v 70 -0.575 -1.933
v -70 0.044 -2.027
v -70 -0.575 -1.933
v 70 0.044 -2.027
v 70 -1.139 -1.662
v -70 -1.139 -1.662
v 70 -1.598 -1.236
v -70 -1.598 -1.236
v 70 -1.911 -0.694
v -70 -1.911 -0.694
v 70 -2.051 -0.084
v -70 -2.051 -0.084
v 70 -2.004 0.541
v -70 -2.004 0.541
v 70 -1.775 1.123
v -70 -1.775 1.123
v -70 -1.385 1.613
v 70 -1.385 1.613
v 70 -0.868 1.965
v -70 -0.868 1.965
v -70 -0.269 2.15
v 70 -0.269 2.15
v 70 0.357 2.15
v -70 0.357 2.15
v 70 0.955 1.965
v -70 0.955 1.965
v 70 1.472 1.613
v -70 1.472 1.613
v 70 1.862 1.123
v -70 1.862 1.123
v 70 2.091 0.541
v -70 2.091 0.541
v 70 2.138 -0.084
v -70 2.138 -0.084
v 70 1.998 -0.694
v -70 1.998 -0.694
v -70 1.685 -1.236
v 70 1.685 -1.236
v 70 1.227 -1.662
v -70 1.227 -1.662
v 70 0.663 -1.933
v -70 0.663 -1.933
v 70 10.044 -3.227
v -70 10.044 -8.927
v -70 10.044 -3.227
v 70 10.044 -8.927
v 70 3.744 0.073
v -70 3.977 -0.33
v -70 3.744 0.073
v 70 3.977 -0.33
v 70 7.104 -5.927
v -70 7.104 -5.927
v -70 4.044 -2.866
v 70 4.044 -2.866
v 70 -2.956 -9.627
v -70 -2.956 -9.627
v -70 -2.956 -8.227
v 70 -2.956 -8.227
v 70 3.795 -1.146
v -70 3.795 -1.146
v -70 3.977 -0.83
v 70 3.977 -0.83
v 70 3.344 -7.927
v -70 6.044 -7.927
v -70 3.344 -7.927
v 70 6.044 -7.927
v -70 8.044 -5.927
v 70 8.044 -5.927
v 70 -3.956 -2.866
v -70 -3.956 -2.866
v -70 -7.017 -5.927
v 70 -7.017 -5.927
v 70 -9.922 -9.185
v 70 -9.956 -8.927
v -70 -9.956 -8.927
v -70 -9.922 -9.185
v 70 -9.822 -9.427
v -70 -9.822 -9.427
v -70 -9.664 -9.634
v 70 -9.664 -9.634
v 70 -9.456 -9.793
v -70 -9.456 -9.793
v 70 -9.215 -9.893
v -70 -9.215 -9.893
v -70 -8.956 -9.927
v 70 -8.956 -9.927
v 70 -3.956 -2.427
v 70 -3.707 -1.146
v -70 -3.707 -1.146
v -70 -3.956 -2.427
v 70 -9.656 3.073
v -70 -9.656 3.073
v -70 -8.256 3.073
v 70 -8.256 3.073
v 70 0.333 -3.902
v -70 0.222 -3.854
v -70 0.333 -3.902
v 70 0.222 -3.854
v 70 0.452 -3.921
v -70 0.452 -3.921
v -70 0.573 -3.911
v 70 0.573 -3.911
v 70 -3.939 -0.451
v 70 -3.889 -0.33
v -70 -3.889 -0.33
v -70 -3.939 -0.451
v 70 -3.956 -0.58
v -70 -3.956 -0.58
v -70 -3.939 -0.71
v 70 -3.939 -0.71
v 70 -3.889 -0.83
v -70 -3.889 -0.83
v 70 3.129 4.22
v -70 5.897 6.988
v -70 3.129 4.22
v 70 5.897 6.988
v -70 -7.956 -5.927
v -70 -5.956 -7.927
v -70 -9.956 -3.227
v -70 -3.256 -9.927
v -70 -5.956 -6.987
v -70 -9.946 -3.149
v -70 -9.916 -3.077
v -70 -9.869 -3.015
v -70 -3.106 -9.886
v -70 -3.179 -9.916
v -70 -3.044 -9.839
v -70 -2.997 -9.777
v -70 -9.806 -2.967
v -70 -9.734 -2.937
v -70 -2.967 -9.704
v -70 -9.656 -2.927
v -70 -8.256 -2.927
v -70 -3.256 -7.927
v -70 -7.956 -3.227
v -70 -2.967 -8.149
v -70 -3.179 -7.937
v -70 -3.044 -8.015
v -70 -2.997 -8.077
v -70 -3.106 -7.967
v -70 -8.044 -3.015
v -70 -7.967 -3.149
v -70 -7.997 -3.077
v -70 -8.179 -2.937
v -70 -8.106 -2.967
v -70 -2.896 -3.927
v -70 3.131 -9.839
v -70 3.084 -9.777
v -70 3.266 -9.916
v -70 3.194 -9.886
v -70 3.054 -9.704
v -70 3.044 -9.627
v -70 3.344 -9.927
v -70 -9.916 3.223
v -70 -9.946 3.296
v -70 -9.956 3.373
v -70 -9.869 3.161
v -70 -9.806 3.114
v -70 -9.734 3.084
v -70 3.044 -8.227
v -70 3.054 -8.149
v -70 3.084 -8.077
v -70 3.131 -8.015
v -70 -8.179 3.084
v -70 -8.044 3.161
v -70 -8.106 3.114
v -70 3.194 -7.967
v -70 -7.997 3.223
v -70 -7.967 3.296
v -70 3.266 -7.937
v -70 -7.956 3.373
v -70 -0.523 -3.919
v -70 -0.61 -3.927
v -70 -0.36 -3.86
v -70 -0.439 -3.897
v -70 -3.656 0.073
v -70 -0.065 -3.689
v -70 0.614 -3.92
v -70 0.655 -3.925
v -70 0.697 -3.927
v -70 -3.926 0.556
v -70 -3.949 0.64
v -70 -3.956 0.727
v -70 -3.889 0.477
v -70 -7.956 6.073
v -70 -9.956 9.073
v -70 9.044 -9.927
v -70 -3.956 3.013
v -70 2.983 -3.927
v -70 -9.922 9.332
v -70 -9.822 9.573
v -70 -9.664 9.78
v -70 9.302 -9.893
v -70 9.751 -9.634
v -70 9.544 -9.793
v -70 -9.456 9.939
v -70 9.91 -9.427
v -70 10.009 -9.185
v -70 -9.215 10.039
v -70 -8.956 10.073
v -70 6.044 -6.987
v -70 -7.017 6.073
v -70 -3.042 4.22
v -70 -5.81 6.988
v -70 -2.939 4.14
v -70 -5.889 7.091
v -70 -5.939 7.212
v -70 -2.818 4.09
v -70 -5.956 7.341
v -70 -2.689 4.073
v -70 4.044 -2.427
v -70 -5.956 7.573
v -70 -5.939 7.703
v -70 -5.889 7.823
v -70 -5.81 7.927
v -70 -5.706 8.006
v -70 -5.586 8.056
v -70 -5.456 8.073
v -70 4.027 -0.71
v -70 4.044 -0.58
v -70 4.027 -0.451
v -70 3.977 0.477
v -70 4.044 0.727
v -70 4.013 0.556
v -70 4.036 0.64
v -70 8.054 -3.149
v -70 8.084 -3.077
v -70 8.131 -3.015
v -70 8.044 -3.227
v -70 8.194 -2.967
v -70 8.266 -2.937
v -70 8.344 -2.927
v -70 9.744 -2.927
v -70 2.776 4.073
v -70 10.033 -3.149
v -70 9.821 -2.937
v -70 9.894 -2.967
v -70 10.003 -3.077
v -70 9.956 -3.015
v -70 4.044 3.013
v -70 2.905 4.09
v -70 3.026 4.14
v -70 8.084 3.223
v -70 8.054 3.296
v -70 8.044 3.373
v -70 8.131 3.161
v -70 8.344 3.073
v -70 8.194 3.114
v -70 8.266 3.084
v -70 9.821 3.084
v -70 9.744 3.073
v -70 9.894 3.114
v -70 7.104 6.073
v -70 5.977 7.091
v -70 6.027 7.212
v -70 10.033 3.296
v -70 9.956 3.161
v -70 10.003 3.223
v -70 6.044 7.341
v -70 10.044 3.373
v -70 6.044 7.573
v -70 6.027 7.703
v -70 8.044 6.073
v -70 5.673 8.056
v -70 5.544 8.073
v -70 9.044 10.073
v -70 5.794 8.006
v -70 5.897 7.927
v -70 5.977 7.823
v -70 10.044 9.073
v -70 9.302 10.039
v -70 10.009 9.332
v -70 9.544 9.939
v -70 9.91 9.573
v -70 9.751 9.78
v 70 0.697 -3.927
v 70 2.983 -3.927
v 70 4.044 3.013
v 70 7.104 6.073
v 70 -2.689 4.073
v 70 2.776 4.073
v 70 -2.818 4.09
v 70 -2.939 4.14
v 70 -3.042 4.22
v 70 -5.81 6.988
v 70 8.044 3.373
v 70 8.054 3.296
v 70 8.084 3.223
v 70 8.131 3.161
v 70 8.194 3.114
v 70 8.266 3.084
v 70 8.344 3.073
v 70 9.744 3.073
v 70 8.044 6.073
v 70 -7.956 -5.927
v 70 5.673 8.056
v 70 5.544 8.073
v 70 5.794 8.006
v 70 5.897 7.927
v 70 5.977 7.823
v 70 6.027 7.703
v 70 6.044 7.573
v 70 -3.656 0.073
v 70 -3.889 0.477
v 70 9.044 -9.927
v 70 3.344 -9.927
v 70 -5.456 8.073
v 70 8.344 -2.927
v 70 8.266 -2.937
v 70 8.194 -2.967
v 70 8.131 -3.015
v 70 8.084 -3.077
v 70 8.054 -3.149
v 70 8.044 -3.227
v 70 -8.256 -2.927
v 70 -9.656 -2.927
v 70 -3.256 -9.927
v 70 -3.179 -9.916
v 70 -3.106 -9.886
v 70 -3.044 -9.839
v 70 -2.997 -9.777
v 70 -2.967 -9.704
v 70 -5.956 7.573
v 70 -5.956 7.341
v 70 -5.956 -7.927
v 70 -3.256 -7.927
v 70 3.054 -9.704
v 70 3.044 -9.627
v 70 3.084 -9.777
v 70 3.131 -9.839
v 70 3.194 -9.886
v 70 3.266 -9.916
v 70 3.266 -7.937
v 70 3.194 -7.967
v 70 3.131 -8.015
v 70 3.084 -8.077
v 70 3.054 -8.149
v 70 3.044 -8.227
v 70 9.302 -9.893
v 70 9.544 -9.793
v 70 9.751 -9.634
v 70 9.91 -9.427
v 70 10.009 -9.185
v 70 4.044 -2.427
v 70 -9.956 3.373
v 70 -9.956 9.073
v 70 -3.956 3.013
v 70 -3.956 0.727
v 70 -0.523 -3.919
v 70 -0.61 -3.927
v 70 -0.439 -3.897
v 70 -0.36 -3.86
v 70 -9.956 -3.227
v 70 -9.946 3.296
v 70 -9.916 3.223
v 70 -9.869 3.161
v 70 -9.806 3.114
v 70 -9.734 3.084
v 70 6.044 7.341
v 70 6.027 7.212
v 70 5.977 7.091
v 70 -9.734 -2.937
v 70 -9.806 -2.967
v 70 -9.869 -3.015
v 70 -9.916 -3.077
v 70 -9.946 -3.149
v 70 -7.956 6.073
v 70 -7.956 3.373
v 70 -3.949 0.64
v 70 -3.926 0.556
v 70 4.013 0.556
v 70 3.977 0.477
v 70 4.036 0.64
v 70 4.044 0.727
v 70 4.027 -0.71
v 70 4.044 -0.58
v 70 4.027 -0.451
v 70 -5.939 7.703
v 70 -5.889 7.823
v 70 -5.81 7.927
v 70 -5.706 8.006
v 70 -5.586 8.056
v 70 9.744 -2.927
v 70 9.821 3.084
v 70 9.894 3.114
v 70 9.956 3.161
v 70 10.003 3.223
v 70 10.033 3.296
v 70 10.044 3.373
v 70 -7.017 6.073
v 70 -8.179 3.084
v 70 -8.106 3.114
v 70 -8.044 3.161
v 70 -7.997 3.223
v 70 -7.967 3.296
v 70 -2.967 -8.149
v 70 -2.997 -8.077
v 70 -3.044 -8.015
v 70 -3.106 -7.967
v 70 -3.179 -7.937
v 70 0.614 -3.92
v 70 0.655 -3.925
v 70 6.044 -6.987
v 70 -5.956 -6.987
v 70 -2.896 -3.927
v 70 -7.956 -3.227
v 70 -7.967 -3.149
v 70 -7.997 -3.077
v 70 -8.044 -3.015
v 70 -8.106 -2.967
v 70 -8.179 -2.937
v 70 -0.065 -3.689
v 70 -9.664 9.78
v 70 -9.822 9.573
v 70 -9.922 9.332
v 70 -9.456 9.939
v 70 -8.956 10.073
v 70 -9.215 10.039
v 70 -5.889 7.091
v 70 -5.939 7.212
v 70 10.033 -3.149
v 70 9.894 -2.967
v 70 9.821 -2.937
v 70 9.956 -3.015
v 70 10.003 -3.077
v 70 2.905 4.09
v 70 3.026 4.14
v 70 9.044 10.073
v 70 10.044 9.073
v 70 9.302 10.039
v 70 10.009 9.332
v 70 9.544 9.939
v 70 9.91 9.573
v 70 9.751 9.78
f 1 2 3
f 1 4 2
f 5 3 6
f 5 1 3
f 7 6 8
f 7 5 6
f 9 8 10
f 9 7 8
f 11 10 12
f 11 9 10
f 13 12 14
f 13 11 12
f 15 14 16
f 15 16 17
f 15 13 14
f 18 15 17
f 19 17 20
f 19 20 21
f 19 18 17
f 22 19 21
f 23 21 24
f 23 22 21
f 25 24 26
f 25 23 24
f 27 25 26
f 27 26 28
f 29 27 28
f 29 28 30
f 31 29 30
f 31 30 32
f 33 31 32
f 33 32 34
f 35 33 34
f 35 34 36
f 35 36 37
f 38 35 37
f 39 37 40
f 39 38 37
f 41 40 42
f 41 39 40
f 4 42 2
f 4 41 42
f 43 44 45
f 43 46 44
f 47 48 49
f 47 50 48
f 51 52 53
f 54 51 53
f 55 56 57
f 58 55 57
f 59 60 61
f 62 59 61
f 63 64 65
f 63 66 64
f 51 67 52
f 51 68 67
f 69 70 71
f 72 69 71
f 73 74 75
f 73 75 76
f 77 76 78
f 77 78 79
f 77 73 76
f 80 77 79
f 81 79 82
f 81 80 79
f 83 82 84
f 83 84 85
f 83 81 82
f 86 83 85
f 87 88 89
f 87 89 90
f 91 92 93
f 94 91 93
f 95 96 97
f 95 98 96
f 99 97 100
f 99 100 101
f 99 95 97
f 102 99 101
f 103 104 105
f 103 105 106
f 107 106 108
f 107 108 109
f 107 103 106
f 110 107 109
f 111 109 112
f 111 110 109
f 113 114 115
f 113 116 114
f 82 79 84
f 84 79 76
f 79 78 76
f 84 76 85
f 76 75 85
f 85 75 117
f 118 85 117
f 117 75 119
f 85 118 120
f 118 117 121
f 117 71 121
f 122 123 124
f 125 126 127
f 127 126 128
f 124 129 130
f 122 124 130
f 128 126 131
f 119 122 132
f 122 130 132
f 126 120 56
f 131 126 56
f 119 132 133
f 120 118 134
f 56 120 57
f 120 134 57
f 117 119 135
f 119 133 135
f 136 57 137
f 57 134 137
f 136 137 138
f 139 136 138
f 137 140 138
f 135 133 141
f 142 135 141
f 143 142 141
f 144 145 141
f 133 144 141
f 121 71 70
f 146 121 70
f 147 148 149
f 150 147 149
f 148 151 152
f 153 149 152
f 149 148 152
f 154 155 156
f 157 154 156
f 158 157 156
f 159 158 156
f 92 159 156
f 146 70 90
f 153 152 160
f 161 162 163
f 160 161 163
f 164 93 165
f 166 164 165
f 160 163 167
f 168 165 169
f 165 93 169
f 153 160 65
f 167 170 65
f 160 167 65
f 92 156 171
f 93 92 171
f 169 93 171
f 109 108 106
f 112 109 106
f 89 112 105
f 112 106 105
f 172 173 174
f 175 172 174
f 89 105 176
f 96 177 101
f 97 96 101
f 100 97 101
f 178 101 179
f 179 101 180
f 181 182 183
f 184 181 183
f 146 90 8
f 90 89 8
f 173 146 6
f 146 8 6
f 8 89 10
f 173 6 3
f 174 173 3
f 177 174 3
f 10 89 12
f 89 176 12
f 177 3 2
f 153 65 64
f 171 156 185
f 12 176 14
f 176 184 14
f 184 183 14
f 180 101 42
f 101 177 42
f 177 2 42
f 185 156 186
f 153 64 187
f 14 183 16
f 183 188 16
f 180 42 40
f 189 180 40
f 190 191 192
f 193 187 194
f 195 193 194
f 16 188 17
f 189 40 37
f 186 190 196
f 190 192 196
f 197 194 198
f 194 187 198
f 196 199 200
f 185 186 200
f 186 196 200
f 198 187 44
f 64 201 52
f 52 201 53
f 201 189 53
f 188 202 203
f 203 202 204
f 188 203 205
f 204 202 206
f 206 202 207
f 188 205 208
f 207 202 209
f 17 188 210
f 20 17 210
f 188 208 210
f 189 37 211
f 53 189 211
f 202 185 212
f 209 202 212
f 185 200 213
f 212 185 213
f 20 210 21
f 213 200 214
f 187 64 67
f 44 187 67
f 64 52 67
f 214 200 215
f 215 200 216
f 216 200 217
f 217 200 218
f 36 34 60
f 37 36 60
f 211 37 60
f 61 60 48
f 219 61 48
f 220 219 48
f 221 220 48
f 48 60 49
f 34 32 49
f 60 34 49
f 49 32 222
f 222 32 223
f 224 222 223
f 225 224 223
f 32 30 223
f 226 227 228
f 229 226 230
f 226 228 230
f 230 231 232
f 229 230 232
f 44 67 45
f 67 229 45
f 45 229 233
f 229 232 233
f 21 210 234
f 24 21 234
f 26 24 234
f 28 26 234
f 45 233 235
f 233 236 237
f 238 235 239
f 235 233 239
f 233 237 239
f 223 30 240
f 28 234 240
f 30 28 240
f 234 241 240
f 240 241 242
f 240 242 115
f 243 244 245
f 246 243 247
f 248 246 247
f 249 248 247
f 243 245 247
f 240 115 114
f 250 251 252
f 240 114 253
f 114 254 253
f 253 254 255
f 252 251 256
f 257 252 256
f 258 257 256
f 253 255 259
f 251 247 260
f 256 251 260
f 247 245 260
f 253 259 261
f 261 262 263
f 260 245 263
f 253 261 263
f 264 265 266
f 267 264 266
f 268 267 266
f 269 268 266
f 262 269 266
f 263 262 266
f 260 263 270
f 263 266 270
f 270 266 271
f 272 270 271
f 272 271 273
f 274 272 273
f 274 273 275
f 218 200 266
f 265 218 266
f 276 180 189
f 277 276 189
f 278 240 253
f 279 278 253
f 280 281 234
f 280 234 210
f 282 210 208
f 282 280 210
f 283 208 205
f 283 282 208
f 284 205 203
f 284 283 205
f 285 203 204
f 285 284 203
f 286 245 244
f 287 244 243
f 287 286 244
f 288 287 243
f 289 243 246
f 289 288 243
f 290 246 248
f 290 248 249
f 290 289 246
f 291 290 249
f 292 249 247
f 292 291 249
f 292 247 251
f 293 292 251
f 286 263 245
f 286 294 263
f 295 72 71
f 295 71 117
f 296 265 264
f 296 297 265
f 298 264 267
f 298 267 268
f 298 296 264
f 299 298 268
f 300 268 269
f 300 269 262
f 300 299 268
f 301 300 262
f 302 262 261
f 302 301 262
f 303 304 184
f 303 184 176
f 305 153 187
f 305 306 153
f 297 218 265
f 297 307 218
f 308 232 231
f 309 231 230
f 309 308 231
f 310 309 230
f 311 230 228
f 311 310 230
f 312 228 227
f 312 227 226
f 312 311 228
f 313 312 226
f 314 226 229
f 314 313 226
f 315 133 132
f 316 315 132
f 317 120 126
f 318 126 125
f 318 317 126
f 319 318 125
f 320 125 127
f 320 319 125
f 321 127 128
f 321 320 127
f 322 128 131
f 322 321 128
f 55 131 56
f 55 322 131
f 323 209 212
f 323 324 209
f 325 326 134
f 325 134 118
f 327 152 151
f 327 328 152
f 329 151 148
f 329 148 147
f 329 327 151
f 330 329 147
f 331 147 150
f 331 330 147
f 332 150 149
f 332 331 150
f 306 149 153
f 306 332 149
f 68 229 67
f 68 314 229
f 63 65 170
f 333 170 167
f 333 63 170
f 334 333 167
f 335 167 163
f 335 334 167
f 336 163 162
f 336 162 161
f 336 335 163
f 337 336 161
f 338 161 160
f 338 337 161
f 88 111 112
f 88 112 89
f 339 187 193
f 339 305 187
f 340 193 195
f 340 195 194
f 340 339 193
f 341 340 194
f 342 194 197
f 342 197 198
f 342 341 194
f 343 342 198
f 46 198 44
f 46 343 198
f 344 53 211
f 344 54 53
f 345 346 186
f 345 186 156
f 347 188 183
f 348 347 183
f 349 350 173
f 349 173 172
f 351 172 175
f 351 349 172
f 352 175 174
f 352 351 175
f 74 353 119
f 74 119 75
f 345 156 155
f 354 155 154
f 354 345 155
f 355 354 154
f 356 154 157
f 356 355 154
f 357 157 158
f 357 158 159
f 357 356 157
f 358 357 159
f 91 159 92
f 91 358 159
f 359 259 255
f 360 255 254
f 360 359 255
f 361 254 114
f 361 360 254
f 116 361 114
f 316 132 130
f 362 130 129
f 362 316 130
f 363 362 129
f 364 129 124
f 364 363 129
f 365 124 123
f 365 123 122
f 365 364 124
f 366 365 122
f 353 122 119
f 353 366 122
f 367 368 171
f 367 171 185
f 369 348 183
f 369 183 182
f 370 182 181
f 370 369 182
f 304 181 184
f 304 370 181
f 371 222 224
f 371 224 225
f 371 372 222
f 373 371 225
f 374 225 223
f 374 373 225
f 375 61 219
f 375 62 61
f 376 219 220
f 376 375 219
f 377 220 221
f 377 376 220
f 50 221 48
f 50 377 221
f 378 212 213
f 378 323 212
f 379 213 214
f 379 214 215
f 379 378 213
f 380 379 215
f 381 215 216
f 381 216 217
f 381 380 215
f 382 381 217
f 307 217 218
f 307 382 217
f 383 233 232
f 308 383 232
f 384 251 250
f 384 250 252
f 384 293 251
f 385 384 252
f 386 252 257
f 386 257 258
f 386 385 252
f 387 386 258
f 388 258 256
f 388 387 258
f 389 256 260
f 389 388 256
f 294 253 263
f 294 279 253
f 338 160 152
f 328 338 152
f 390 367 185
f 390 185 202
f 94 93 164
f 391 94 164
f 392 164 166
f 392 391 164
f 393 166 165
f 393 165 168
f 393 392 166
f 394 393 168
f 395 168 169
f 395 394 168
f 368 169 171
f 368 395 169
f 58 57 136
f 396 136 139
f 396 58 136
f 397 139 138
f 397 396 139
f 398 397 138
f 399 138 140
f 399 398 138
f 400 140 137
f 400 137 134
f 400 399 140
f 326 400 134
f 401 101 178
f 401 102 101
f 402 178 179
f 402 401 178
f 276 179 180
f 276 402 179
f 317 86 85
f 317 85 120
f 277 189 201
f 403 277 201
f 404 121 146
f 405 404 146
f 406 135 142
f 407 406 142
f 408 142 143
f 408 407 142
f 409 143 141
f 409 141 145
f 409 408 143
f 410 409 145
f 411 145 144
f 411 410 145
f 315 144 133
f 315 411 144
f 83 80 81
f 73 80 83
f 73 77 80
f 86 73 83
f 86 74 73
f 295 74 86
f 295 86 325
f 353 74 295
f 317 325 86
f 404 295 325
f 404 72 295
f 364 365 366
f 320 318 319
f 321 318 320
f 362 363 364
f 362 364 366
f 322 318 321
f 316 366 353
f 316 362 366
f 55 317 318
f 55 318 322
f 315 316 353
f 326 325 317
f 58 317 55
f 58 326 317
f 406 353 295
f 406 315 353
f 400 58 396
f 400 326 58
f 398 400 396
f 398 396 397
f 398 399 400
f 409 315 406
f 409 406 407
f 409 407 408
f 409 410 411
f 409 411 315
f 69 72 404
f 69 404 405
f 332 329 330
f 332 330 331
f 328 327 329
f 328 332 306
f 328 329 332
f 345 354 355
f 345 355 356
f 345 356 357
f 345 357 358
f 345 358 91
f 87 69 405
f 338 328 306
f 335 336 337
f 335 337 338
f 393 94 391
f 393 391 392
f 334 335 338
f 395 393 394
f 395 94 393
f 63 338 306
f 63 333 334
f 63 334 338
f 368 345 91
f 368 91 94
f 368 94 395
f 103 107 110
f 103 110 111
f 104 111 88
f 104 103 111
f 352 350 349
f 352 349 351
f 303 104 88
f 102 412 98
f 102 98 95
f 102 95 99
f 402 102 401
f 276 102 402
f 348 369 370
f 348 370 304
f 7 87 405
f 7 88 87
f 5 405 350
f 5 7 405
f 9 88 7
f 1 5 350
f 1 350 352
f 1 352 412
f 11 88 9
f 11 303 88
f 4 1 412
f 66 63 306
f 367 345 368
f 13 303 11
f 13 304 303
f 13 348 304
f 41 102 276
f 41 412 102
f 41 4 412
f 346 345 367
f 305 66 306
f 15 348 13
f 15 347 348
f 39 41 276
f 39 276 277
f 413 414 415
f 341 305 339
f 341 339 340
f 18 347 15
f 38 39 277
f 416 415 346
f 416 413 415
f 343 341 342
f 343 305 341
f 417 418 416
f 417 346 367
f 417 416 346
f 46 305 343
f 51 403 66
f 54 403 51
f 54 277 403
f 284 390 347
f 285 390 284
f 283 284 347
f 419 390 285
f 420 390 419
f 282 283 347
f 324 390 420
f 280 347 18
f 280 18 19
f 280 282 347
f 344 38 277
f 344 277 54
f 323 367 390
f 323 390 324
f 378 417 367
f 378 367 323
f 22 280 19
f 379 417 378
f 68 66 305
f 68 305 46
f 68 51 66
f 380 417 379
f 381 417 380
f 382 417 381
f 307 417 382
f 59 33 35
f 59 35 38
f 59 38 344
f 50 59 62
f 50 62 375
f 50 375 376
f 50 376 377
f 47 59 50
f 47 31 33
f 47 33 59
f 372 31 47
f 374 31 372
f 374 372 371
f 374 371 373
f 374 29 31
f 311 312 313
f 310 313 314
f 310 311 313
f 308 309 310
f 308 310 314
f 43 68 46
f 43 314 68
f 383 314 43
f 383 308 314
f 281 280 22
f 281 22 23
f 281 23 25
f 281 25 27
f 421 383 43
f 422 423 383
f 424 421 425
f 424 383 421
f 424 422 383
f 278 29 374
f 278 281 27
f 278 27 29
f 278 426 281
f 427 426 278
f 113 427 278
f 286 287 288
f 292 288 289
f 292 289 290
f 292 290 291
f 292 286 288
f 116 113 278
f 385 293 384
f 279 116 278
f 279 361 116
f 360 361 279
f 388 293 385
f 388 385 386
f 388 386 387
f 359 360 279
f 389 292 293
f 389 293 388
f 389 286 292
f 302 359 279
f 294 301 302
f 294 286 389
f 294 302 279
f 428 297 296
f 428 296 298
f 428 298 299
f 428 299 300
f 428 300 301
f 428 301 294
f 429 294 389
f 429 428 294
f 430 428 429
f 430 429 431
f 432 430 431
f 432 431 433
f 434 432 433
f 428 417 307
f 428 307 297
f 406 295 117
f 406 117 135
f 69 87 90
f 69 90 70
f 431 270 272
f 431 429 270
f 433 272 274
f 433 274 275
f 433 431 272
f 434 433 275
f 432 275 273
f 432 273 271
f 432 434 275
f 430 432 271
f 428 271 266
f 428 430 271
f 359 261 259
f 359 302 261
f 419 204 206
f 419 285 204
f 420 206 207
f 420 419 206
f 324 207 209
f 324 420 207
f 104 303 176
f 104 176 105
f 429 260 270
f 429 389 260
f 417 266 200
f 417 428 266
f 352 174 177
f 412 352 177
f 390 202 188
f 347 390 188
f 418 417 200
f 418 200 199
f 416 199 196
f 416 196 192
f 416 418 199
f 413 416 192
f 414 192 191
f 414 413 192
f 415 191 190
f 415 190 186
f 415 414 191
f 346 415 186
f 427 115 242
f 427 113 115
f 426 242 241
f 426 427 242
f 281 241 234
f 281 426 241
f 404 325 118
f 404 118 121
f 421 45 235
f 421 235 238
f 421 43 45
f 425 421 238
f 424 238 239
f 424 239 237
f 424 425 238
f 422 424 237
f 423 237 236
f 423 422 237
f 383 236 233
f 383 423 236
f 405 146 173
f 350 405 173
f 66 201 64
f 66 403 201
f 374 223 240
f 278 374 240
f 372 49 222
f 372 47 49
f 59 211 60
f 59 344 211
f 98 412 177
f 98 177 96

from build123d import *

# Parameters (mm, degrees)
F1_DEPTH = 70


# Not quite as in the source:
# - ends of sketch curves that miss each other by under 0.0002 mm in the source are joined


with BuildPart() as f1:
    # F0 (on Right) → F1 (new body, symmetric)
    with BuildSketch(Plane.YZ):
        with BuildLine():
            Line((9.043565, 10.073321), (0.043565, 10.073321))
            Line((0.043565, 10.073321), (-8.956435, 10.073321))
            ThreePointArc((-8.956435, 10.073321), (-9.6635417812, 9.7804277812), (-9.956435, 9.073321))
            Line((-9.956435, 9.073321), (-9.956435, 3.373321))
            ThreePointArc((-9.956435, 3.373321), (-9.8685670344, 3.1611889656), (-9.656435, 3.073321))
            Line((-9.656435, 3.073321), (-8.256435, 3.073321))
            ThreePointArc((-8.256435, 3.073321), (-8.0443029656, 3.1611889656), (-7.956435, 3.373321))
            Line((-7.956435, 3.373321), (-7.956435, 6.073321))
            Line((-7.956435, 6.073321), (-7.017095, 6.073321))
            Line((-7.017095, 6.073321), (-3.956435, 3.012661))
            Line((-3.956435, 3.012661), (-3.956435, 0.726911))
            ThreePointArc((-3.956435, 0.726911), (-3.9393979324, 0.5975015494), (-3.8894477764, 0.4769111291))
            Line((-3.8894477764, 0.4769111291), (-3.656435, 0.073321))
            Line((-3.656435, 0.073321), (-3.889448, -0.330269))
            ThreePointArc((-3.889448, -0.330269), (-3.956435, -0.580269), (-3.8894477764, -0.8302688709))
            Line((-3.8894477764, -0.8302688709), (-3.707412, -1.145565))
            Line((-3.707412, -1.145565), (-3.956435, -2.426679))
            Line((-3.956435, -2.426679), (-3.956435, -2.866019))
            Line((-3.956435, -2.866019), (-7.017095, -5.926679))
            Line((-7.017095, -5.926679), (-7.956435, -5.926679))
            Line((-7.956435, -5.926679), (-7.956435, -3.226679))
            ThreePointArc((-7.956435, -3.226679), (-8.0443029656, -3.0145469656), (-8.256435, -2.926679))
            Line((-8.256435, -2.926679), (-9.656435, -2.926679))
            ThreePointArc((-9.656435, -2.926679), (-9.8685670344, -3.0145469656), (-9.956435, -3.226679))
            Line((-9.956435, -3.226679), (-9.956435, -8.926679))
            ThreePointArc((-9.956435, -8.926679), (-9.6635417812, -9.6337857812), (-8.956435, -9.926679))
            Line((-8.956435, -9.926679), (-3.256435, -9.926679))
            ThreePointArc((-3.256435, -9.926679), (-3.0443029656, -9.8388110344), (-2.956435, -9.626679))
            Line((-2.956435, -9.626679), (-2.956435, -8.226679))
            ThreePointArc((-2.956435, -8.226679), (-3.0443029656, -8.0145469656), (-3.256435, -7.926679))
            Line((-3.256435, -7.926679), (-5.956435, -7.926679))
            Line((-5.956435, -7.926679), (-5.956435, -6.987339))
            Line((-5.956435, -6.987339), (-2.895775, -3.926679))
            Line((-2.895775, -3.926679), (-0.610025, -3.926679))
            ThreePointArc((-0.610025, -3.926679), (-0.4806155494, -3.9096419324), (-0.3600251291, -3.8596917764))
            Line((-0.3600251291, -3.8596917764), (-0.0645959325, -3.6891257984))
            Line((-0.0645959325, -3.6891257984), (0.2217128734, -3.8544264098))
            ThreePointArc((0.2217128734, -3.8544264098), (0.3921793907, -3.9150473077), (0.5730594828, -3.9110345539))
            ThreePointArc((0.5730594828, -3.9110345539), (0.6346161199, -3.9227524708), (0.697155, -3.926679))
            Line((0.697155, -3.926679), (2.982905, -3.926679))
            Line((2.982905, -3.926679), (6.043565, -6.987339))
            Line((6.043565, -6.987339), (6.043565, -7.926679))
            Line((6.043565, -7.926679), (3.343565, -7.926679))
            ThreePointArc((3.343565, -7.926679), (3.1314329656, -8.0145469656), (3.043565, -8.226679))
            Line((3.043565, -8.226679), (3.043565, -9.626679))
            ThreePointArc((3.043565, -9.626679), (3.1314329656, -9.8388110344), (3.343565, -9.926679))
            Line((3.343565, -9.926679), (9.043565, -9.926679))
            ThreePointArc((9.043565, -9.926679), (9.7506717812, -9.6337857812), (10.043565, -8.926679))
            Line((10.043565, -8.926679), (10.043565, -3.226679))
            ThreePointArc((10.043565, -3.226679), (9.9556970344, -3.0145469656), (9.743565, -2.926679))
            Line((9.743565, -2.926679), (8.343565, -2.926679))
            ThreePointArc((8.343565, -2.926679), (8.1314329656, -3.0145469656), (8.043565, -3.226679))
            Line((8.043565, -3.226679), (8.043565, -5.926679))
            Line((8.043565, -5.926679), (7.104225, -5.926679))
            Line((7.104225, -5.926679), (4.043565, -2.866019))
            Line((4.043565, -2.866019), (4.043565, -2.426679))
            Line((4.043565, -2.426679), (3.794542, -1.145565))
            Line((3.794542, -1.145565), (3.976578, -0.830269))
            ThreePointArc((3.976578, -0.830269), (4.043565, -0.580269), (3.9765777764, -0.3302691291))
            Line((3.9765777764, -0.3302691291), (3.743565, 0.073321))
            Line((3.743565, 0.073321), (3.976578, 0.476911))
            ThreePointArc((3.976578, 0.476911), (4.0265279324, 0.5975015494), (4.043565, 0.726911))
            Line((4.043565, 0.726911), (4.043565, 3.012661))
            Line((4.043565, 3.012661), (7.104225, 6.073321))
            Line((7.104225, 6.073321), (8.043565, 6.073321))
            Line((8.043565, 6.073321), (8.043565, 3.373321))
            ThreePointArc((8.043565, 3.373321), (8.1314329656, 3.1611889656), (8.343565, 3.073321))
            Line((8.343565, 3.073321), (9.743565, 3.073321))
            ThreePointArc((9.743565, 3.073321), (9.9556970344, 3.1611889656), (10.043565, 3.373321))
            Line((10.043565, 3.373321), (10.043565, 9.073321))
            ThreePointArc((10.043565, 9.073321), (9.7506717812, 9.7804277812), (9.043565, 10.073321))
        make_face()
        with BuildLine():
            ThreePointArc((0.043565, 2.173321), (2.143565, 0.073321), (0.043565, -2.026679))
            ThreePointArc((0.043565, -2.026679), (-2.056435, 0.073321), (0.043565, 2.173321))
        make_face(mode=Mode.SUBTRACT)
        with BuildLine():
            Line((2.775798, 4.073321), (0.043565, 4.073321))
            Line((0.043565, 4.073321), (-2.688668, 4.073321))
            ThreePointArc((-2.688668, 4.073321), (-2.8800097162, 4.1113812337), (-3.0422213906, 4.2197676094))
            Line((-3.0422213906, 4.2197676094), (-5.809988, 6.987535))
            ThreePointArc((-5.809988, 6.987535), (-5.9183747663, 7.1497462838), (-5.956435, 7.341088))
            Line((-5.956435, 7.341088), (-5.956435, 7.573321))
            ThreePointArc((-5.956435, 7.573321), (-5.8099883906, 7.9268743906), (-5.456435, 8.073321))
            Line((-5.456435, 8.073321), (0.043565, 8.073321))
            Line((0.043565, 8.073321), (5.543565, 8.073321))
            ThreePointArc((5.543565, 8.073321), (5.8971183906, 7.9268743906), (6.043565, 7.573321))
            Line((6.043565, 7.573321), (6.043565, 7.341088))
            ThreePointArc((6.043565, 7.341088), (6.0055047663, 7.1497462838), (5.8971183906, 6.9875346094))
            Line((5.8971183906, 6.9875346094), (3.129351, 4.219768))
            ThreePointArc((3.129351, 4.219768), (2.9671397162, 4.1113812337), (2.775798, 4.073321))
        make_face(mode=Mode.SUBTRACT)
    extrude(amount=F1_DEPTH, both=True)


solid = f1.part
